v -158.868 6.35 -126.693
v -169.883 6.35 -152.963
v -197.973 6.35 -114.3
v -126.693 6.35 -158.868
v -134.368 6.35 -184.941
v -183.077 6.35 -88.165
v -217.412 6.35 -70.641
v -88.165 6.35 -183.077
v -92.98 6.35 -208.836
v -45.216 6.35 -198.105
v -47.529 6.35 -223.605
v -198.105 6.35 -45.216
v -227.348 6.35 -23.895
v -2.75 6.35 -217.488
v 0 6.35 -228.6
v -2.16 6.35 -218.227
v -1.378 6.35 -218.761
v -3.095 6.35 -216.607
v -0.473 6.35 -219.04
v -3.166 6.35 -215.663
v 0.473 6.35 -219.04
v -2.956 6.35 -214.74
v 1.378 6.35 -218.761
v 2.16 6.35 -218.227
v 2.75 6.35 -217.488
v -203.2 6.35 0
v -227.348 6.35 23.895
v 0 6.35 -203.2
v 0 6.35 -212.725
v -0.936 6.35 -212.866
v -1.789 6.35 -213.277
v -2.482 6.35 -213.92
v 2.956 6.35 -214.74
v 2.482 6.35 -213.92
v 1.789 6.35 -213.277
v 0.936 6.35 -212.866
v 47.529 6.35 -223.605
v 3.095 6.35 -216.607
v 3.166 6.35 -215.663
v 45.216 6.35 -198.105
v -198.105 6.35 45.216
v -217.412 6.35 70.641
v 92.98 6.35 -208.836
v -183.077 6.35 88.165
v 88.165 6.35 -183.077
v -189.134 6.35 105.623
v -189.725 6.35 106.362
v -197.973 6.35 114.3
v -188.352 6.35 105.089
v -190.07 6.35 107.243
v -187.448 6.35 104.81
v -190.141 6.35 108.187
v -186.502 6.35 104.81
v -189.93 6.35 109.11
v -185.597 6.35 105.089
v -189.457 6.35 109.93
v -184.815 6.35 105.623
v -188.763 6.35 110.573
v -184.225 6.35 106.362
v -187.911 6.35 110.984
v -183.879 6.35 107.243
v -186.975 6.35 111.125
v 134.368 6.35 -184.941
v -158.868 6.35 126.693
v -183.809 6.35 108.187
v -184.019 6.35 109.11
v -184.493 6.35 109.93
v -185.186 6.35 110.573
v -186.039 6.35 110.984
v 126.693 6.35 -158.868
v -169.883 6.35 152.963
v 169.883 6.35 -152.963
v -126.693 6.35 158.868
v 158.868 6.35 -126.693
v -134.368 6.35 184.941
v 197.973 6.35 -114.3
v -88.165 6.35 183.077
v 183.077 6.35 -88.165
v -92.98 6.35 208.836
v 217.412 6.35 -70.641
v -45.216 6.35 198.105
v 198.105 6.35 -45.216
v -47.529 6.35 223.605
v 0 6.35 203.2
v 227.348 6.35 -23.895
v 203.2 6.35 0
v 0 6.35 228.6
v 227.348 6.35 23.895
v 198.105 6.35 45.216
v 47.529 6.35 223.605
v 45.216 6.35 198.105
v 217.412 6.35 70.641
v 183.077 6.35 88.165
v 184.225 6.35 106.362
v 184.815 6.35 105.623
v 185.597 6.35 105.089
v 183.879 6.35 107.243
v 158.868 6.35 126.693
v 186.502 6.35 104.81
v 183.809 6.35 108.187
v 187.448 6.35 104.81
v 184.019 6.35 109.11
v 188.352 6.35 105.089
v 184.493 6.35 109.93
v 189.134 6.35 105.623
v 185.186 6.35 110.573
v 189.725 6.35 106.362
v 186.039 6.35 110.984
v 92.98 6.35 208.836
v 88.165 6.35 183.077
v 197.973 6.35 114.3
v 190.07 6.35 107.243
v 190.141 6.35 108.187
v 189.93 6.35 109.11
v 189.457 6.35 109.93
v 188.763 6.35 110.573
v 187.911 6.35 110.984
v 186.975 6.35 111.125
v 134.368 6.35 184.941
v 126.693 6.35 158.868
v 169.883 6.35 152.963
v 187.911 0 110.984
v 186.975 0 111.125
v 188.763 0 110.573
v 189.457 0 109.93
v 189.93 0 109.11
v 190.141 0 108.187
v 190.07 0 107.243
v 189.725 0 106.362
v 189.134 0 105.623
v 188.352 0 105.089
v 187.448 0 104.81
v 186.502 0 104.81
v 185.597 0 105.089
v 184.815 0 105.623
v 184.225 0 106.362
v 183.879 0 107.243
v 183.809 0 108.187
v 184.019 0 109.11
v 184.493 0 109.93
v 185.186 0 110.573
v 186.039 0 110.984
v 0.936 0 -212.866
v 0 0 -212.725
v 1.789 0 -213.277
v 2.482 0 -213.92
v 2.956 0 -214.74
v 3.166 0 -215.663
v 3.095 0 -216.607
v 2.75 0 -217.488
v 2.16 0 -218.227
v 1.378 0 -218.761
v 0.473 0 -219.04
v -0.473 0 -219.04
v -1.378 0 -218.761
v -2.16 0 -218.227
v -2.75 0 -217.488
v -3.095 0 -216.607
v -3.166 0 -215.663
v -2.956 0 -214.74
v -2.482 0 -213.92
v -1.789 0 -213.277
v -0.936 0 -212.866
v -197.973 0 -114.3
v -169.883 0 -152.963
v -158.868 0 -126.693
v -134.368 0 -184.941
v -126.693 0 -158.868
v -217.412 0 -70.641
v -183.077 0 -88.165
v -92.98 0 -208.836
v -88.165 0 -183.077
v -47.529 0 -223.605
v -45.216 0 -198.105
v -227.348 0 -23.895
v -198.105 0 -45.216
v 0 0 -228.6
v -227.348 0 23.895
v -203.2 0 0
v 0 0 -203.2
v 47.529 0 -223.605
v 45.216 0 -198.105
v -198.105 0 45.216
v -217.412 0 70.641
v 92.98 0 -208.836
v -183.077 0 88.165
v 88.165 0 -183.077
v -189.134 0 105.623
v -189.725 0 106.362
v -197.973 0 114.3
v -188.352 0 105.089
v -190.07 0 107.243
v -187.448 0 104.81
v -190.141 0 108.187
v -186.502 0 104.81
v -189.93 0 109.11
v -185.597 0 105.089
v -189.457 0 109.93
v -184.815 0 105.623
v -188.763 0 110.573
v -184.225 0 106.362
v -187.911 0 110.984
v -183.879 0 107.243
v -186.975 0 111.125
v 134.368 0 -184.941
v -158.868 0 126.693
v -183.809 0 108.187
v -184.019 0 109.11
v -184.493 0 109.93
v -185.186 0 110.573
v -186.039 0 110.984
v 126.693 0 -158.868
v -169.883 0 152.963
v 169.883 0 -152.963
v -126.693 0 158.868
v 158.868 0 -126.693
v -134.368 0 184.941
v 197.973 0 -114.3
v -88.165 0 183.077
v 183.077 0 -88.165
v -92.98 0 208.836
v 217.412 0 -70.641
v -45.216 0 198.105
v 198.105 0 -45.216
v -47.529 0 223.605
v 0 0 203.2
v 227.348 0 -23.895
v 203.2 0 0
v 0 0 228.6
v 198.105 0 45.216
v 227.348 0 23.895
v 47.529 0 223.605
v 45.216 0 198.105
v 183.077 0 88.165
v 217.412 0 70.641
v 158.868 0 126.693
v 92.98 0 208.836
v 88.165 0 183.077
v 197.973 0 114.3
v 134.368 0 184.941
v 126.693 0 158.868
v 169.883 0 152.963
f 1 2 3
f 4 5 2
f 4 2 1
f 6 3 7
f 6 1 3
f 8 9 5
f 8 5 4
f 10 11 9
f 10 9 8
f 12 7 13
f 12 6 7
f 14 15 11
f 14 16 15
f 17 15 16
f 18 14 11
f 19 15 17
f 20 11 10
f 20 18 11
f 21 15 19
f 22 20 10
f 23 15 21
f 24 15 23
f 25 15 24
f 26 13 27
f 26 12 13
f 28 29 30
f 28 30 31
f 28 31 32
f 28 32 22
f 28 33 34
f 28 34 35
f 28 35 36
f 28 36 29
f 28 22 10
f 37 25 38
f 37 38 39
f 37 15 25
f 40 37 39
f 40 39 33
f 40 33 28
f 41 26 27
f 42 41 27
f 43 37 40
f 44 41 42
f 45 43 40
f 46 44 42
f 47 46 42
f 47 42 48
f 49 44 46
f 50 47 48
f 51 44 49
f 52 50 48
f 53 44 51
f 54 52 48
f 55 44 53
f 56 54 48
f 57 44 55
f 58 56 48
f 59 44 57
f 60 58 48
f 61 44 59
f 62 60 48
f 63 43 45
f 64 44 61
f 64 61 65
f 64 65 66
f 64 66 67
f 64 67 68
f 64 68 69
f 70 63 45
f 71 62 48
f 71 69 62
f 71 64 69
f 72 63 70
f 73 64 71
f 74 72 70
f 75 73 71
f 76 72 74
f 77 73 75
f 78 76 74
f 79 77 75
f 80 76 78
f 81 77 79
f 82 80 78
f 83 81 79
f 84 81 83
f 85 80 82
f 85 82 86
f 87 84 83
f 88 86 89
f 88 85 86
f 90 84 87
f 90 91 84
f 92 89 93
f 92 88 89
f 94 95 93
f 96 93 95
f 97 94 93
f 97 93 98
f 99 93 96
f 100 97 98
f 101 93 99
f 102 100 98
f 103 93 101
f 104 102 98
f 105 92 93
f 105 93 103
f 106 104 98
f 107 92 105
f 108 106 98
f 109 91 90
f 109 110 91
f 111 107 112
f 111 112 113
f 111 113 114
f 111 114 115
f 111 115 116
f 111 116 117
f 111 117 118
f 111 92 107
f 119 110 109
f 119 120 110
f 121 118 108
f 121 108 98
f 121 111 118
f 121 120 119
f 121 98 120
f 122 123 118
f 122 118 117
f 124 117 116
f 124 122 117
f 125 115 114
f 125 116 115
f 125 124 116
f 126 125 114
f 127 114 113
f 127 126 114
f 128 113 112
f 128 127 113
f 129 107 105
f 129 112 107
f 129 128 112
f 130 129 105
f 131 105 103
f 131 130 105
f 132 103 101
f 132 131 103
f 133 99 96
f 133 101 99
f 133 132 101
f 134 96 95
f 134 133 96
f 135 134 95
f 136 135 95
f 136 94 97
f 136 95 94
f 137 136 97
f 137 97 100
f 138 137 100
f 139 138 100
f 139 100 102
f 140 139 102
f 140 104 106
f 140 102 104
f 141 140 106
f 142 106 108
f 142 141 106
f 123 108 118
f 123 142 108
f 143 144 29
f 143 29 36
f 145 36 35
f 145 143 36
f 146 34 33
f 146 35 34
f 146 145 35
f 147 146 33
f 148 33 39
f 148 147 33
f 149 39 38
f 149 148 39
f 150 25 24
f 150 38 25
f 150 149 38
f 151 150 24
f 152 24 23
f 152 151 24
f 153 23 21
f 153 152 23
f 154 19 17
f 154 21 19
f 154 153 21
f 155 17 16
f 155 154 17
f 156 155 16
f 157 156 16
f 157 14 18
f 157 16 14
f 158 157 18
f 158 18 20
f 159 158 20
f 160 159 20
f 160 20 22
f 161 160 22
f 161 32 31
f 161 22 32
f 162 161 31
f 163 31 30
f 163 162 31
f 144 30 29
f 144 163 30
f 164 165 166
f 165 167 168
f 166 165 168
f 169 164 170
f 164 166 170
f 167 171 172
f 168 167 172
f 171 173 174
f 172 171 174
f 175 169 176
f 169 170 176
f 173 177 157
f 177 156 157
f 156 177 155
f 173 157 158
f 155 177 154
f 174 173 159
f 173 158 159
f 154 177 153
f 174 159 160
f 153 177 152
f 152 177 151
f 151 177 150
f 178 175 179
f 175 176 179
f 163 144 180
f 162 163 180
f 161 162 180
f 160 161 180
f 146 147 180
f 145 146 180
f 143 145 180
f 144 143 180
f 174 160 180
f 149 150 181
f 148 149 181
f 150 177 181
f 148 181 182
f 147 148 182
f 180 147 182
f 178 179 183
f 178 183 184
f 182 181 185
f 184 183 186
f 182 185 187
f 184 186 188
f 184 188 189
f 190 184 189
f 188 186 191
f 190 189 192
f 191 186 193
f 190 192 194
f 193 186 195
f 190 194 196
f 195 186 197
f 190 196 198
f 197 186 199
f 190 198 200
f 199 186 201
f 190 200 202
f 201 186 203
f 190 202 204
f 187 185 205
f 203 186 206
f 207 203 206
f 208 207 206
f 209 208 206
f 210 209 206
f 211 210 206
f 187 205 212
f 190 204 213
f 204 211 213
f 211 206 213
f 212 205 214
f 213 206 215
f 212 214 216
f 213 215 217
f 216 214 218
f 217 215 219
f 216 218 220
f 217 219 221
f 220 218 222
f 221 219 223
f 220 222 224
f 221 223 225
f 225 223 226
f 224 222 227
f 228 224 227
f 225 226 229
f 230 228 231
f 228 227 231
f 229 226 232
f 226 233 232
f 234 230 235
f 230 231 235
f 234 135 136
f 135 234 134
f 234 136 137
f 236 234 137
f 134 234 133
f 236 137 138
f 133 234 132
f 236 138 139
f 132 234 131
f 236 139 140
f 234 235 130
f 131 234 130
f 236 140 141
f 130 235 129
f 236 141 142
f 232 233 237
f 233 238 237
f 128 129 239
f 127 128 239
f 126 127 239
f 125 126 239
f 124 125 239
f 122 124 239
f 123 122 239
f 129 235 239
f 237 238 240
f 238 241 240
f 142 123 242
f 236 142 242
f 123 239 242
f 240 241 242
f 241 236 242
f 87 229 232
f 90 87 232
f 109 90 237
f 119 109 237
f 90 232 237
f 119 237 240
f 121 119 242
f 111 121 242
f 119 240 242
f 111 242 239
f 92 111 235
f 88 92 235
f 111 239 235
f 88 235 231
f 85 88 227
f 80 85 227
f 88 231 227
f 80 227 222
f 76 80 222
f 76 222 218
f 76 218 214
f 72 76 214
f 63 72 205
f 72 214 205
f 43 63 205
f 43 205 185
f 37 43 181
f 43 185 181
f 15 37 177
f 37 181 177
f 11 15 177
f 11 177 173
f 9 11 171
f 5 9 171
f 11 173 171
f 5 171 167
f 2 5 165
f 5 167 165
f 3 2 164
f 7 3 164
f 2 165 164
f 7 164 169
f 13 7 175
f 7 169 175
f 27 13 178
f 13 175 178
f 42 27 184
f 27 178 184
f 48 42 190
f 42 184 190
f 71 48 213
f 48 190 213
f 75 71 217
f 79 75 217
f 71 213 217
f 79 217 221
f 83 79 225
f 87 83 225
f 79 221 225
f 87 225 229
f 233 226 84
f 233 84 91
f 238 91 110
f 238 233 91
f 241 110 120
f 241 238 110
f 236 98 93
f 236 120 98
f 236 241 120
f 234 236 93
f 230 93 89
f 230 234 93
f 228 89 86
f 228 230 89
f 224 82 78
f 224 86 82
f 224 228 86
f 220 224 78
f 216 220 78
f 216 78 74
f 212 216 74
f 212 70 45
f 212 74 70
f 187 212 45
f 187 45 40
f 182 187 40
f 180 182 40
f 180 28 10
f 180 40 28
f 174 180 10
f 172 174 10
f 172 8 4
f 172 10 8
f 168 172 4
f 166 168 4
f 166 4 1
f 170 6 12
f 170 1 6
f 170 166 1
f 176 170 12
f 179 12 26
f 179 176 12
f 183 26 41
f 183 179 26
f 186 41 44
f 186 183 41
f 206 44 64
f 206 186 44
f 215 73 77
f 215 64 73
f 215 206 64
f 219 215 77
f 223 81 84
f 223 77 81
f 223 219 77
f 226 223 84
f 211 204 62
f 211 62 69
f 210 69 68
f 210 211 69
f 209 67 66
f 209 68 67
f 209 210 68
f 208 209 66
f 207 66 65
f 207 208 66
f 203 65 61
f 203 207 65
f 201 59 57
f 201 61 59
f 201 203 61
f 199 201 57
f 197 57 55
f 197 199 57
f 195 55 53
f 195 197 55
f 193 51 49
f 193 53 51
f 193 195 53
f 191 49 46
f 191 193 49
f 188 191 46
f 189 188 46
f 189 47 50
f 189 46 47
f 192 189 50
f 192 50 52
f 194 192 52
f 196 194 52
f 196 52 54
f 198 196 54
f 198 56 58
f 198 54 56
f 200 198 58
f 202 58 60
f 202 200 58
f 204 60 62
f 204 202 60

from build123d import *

# Parameters (mm, degrees)
SKETCH1_R               = 228.6
BOSS_EXTRUDE1_DEPTH     = 6.35
CUT_EXTRUDE1_DEPTH      = 324.351577234
CUT_EXTRUDE1_DEPTH_BACK = 324.351577234
SKETCH2_R               = 3.175
CUT_EXTRUDE2_DEPTH      = 324.351577234
CUT_EXTRUDE2_DEPTH_BACK = 324.351577234
SKETCH3_R               = 203.2


with BuildPart() as part:
    # Sketch1 → Boss-Extrude1 (new body)
    with BuildSketch(Plane(origin=(0, 0, 0), x_dir=(1, 0, 0), z_dir=(0, 1, 0))):
        with Locations(Location((0, 0, 0), (0, 0, 270))):
            Circle(SKETCH1_R)
    extrude(amount=BOSS_EXTRUDE1_DEPTH)

    # Sketch2 → Cut-Extrude1 (cut, two sides: drawn at the far end of the back side and taken through both)
    with BuildSketch(Plane(origin=(0, 6.35, 0), x_dir=(1, 0, 0), z_dir=(0, 1, 0)).offset(-CUT_EXTRUDE1_DEPTH_BACK)):
        with Locations(Location((0, 215.9, 0), (0, 0, 270))):
            Circle(SKETCH2_R)
        with Locations(Location((-186.974884677, -107.95, 0), (0, 0, 270))):
            Circle(SKETCH2_R)
        with Locations(Location((186.974884677, -107.95, 0), (0, 0, 270))):
            Circle(SKETCH2_R)
    extrude(amount=CUT_EXTRUDE1_DEPTH + CUT_EXTRUDE1_DEPTH_BACK, mode=Mode.SUBTRACT)

    # Sketch3 → Cut-Extrude2 (cut, two sides: drawn at the far end of the back side and taken through both)
    with BuildSketch(Plane(origin=(0, 6.35, 0), x_dir=(1, 0, 0), z_dir=(0, 1, 0)).offset(-CUT_EXTRUDE2_DEPTH_BACK)):
        with Locations(Location((0, 0, 0), (0, 0, 270))):
            Circle(SKETCH3_R)
    extrude(amount=CUT_EXTRUDE2_DEPTH + CUT_EXTRUDE2_DEPTH_BACK, mode=Mode.SUBTRACT)


solid = part.part
